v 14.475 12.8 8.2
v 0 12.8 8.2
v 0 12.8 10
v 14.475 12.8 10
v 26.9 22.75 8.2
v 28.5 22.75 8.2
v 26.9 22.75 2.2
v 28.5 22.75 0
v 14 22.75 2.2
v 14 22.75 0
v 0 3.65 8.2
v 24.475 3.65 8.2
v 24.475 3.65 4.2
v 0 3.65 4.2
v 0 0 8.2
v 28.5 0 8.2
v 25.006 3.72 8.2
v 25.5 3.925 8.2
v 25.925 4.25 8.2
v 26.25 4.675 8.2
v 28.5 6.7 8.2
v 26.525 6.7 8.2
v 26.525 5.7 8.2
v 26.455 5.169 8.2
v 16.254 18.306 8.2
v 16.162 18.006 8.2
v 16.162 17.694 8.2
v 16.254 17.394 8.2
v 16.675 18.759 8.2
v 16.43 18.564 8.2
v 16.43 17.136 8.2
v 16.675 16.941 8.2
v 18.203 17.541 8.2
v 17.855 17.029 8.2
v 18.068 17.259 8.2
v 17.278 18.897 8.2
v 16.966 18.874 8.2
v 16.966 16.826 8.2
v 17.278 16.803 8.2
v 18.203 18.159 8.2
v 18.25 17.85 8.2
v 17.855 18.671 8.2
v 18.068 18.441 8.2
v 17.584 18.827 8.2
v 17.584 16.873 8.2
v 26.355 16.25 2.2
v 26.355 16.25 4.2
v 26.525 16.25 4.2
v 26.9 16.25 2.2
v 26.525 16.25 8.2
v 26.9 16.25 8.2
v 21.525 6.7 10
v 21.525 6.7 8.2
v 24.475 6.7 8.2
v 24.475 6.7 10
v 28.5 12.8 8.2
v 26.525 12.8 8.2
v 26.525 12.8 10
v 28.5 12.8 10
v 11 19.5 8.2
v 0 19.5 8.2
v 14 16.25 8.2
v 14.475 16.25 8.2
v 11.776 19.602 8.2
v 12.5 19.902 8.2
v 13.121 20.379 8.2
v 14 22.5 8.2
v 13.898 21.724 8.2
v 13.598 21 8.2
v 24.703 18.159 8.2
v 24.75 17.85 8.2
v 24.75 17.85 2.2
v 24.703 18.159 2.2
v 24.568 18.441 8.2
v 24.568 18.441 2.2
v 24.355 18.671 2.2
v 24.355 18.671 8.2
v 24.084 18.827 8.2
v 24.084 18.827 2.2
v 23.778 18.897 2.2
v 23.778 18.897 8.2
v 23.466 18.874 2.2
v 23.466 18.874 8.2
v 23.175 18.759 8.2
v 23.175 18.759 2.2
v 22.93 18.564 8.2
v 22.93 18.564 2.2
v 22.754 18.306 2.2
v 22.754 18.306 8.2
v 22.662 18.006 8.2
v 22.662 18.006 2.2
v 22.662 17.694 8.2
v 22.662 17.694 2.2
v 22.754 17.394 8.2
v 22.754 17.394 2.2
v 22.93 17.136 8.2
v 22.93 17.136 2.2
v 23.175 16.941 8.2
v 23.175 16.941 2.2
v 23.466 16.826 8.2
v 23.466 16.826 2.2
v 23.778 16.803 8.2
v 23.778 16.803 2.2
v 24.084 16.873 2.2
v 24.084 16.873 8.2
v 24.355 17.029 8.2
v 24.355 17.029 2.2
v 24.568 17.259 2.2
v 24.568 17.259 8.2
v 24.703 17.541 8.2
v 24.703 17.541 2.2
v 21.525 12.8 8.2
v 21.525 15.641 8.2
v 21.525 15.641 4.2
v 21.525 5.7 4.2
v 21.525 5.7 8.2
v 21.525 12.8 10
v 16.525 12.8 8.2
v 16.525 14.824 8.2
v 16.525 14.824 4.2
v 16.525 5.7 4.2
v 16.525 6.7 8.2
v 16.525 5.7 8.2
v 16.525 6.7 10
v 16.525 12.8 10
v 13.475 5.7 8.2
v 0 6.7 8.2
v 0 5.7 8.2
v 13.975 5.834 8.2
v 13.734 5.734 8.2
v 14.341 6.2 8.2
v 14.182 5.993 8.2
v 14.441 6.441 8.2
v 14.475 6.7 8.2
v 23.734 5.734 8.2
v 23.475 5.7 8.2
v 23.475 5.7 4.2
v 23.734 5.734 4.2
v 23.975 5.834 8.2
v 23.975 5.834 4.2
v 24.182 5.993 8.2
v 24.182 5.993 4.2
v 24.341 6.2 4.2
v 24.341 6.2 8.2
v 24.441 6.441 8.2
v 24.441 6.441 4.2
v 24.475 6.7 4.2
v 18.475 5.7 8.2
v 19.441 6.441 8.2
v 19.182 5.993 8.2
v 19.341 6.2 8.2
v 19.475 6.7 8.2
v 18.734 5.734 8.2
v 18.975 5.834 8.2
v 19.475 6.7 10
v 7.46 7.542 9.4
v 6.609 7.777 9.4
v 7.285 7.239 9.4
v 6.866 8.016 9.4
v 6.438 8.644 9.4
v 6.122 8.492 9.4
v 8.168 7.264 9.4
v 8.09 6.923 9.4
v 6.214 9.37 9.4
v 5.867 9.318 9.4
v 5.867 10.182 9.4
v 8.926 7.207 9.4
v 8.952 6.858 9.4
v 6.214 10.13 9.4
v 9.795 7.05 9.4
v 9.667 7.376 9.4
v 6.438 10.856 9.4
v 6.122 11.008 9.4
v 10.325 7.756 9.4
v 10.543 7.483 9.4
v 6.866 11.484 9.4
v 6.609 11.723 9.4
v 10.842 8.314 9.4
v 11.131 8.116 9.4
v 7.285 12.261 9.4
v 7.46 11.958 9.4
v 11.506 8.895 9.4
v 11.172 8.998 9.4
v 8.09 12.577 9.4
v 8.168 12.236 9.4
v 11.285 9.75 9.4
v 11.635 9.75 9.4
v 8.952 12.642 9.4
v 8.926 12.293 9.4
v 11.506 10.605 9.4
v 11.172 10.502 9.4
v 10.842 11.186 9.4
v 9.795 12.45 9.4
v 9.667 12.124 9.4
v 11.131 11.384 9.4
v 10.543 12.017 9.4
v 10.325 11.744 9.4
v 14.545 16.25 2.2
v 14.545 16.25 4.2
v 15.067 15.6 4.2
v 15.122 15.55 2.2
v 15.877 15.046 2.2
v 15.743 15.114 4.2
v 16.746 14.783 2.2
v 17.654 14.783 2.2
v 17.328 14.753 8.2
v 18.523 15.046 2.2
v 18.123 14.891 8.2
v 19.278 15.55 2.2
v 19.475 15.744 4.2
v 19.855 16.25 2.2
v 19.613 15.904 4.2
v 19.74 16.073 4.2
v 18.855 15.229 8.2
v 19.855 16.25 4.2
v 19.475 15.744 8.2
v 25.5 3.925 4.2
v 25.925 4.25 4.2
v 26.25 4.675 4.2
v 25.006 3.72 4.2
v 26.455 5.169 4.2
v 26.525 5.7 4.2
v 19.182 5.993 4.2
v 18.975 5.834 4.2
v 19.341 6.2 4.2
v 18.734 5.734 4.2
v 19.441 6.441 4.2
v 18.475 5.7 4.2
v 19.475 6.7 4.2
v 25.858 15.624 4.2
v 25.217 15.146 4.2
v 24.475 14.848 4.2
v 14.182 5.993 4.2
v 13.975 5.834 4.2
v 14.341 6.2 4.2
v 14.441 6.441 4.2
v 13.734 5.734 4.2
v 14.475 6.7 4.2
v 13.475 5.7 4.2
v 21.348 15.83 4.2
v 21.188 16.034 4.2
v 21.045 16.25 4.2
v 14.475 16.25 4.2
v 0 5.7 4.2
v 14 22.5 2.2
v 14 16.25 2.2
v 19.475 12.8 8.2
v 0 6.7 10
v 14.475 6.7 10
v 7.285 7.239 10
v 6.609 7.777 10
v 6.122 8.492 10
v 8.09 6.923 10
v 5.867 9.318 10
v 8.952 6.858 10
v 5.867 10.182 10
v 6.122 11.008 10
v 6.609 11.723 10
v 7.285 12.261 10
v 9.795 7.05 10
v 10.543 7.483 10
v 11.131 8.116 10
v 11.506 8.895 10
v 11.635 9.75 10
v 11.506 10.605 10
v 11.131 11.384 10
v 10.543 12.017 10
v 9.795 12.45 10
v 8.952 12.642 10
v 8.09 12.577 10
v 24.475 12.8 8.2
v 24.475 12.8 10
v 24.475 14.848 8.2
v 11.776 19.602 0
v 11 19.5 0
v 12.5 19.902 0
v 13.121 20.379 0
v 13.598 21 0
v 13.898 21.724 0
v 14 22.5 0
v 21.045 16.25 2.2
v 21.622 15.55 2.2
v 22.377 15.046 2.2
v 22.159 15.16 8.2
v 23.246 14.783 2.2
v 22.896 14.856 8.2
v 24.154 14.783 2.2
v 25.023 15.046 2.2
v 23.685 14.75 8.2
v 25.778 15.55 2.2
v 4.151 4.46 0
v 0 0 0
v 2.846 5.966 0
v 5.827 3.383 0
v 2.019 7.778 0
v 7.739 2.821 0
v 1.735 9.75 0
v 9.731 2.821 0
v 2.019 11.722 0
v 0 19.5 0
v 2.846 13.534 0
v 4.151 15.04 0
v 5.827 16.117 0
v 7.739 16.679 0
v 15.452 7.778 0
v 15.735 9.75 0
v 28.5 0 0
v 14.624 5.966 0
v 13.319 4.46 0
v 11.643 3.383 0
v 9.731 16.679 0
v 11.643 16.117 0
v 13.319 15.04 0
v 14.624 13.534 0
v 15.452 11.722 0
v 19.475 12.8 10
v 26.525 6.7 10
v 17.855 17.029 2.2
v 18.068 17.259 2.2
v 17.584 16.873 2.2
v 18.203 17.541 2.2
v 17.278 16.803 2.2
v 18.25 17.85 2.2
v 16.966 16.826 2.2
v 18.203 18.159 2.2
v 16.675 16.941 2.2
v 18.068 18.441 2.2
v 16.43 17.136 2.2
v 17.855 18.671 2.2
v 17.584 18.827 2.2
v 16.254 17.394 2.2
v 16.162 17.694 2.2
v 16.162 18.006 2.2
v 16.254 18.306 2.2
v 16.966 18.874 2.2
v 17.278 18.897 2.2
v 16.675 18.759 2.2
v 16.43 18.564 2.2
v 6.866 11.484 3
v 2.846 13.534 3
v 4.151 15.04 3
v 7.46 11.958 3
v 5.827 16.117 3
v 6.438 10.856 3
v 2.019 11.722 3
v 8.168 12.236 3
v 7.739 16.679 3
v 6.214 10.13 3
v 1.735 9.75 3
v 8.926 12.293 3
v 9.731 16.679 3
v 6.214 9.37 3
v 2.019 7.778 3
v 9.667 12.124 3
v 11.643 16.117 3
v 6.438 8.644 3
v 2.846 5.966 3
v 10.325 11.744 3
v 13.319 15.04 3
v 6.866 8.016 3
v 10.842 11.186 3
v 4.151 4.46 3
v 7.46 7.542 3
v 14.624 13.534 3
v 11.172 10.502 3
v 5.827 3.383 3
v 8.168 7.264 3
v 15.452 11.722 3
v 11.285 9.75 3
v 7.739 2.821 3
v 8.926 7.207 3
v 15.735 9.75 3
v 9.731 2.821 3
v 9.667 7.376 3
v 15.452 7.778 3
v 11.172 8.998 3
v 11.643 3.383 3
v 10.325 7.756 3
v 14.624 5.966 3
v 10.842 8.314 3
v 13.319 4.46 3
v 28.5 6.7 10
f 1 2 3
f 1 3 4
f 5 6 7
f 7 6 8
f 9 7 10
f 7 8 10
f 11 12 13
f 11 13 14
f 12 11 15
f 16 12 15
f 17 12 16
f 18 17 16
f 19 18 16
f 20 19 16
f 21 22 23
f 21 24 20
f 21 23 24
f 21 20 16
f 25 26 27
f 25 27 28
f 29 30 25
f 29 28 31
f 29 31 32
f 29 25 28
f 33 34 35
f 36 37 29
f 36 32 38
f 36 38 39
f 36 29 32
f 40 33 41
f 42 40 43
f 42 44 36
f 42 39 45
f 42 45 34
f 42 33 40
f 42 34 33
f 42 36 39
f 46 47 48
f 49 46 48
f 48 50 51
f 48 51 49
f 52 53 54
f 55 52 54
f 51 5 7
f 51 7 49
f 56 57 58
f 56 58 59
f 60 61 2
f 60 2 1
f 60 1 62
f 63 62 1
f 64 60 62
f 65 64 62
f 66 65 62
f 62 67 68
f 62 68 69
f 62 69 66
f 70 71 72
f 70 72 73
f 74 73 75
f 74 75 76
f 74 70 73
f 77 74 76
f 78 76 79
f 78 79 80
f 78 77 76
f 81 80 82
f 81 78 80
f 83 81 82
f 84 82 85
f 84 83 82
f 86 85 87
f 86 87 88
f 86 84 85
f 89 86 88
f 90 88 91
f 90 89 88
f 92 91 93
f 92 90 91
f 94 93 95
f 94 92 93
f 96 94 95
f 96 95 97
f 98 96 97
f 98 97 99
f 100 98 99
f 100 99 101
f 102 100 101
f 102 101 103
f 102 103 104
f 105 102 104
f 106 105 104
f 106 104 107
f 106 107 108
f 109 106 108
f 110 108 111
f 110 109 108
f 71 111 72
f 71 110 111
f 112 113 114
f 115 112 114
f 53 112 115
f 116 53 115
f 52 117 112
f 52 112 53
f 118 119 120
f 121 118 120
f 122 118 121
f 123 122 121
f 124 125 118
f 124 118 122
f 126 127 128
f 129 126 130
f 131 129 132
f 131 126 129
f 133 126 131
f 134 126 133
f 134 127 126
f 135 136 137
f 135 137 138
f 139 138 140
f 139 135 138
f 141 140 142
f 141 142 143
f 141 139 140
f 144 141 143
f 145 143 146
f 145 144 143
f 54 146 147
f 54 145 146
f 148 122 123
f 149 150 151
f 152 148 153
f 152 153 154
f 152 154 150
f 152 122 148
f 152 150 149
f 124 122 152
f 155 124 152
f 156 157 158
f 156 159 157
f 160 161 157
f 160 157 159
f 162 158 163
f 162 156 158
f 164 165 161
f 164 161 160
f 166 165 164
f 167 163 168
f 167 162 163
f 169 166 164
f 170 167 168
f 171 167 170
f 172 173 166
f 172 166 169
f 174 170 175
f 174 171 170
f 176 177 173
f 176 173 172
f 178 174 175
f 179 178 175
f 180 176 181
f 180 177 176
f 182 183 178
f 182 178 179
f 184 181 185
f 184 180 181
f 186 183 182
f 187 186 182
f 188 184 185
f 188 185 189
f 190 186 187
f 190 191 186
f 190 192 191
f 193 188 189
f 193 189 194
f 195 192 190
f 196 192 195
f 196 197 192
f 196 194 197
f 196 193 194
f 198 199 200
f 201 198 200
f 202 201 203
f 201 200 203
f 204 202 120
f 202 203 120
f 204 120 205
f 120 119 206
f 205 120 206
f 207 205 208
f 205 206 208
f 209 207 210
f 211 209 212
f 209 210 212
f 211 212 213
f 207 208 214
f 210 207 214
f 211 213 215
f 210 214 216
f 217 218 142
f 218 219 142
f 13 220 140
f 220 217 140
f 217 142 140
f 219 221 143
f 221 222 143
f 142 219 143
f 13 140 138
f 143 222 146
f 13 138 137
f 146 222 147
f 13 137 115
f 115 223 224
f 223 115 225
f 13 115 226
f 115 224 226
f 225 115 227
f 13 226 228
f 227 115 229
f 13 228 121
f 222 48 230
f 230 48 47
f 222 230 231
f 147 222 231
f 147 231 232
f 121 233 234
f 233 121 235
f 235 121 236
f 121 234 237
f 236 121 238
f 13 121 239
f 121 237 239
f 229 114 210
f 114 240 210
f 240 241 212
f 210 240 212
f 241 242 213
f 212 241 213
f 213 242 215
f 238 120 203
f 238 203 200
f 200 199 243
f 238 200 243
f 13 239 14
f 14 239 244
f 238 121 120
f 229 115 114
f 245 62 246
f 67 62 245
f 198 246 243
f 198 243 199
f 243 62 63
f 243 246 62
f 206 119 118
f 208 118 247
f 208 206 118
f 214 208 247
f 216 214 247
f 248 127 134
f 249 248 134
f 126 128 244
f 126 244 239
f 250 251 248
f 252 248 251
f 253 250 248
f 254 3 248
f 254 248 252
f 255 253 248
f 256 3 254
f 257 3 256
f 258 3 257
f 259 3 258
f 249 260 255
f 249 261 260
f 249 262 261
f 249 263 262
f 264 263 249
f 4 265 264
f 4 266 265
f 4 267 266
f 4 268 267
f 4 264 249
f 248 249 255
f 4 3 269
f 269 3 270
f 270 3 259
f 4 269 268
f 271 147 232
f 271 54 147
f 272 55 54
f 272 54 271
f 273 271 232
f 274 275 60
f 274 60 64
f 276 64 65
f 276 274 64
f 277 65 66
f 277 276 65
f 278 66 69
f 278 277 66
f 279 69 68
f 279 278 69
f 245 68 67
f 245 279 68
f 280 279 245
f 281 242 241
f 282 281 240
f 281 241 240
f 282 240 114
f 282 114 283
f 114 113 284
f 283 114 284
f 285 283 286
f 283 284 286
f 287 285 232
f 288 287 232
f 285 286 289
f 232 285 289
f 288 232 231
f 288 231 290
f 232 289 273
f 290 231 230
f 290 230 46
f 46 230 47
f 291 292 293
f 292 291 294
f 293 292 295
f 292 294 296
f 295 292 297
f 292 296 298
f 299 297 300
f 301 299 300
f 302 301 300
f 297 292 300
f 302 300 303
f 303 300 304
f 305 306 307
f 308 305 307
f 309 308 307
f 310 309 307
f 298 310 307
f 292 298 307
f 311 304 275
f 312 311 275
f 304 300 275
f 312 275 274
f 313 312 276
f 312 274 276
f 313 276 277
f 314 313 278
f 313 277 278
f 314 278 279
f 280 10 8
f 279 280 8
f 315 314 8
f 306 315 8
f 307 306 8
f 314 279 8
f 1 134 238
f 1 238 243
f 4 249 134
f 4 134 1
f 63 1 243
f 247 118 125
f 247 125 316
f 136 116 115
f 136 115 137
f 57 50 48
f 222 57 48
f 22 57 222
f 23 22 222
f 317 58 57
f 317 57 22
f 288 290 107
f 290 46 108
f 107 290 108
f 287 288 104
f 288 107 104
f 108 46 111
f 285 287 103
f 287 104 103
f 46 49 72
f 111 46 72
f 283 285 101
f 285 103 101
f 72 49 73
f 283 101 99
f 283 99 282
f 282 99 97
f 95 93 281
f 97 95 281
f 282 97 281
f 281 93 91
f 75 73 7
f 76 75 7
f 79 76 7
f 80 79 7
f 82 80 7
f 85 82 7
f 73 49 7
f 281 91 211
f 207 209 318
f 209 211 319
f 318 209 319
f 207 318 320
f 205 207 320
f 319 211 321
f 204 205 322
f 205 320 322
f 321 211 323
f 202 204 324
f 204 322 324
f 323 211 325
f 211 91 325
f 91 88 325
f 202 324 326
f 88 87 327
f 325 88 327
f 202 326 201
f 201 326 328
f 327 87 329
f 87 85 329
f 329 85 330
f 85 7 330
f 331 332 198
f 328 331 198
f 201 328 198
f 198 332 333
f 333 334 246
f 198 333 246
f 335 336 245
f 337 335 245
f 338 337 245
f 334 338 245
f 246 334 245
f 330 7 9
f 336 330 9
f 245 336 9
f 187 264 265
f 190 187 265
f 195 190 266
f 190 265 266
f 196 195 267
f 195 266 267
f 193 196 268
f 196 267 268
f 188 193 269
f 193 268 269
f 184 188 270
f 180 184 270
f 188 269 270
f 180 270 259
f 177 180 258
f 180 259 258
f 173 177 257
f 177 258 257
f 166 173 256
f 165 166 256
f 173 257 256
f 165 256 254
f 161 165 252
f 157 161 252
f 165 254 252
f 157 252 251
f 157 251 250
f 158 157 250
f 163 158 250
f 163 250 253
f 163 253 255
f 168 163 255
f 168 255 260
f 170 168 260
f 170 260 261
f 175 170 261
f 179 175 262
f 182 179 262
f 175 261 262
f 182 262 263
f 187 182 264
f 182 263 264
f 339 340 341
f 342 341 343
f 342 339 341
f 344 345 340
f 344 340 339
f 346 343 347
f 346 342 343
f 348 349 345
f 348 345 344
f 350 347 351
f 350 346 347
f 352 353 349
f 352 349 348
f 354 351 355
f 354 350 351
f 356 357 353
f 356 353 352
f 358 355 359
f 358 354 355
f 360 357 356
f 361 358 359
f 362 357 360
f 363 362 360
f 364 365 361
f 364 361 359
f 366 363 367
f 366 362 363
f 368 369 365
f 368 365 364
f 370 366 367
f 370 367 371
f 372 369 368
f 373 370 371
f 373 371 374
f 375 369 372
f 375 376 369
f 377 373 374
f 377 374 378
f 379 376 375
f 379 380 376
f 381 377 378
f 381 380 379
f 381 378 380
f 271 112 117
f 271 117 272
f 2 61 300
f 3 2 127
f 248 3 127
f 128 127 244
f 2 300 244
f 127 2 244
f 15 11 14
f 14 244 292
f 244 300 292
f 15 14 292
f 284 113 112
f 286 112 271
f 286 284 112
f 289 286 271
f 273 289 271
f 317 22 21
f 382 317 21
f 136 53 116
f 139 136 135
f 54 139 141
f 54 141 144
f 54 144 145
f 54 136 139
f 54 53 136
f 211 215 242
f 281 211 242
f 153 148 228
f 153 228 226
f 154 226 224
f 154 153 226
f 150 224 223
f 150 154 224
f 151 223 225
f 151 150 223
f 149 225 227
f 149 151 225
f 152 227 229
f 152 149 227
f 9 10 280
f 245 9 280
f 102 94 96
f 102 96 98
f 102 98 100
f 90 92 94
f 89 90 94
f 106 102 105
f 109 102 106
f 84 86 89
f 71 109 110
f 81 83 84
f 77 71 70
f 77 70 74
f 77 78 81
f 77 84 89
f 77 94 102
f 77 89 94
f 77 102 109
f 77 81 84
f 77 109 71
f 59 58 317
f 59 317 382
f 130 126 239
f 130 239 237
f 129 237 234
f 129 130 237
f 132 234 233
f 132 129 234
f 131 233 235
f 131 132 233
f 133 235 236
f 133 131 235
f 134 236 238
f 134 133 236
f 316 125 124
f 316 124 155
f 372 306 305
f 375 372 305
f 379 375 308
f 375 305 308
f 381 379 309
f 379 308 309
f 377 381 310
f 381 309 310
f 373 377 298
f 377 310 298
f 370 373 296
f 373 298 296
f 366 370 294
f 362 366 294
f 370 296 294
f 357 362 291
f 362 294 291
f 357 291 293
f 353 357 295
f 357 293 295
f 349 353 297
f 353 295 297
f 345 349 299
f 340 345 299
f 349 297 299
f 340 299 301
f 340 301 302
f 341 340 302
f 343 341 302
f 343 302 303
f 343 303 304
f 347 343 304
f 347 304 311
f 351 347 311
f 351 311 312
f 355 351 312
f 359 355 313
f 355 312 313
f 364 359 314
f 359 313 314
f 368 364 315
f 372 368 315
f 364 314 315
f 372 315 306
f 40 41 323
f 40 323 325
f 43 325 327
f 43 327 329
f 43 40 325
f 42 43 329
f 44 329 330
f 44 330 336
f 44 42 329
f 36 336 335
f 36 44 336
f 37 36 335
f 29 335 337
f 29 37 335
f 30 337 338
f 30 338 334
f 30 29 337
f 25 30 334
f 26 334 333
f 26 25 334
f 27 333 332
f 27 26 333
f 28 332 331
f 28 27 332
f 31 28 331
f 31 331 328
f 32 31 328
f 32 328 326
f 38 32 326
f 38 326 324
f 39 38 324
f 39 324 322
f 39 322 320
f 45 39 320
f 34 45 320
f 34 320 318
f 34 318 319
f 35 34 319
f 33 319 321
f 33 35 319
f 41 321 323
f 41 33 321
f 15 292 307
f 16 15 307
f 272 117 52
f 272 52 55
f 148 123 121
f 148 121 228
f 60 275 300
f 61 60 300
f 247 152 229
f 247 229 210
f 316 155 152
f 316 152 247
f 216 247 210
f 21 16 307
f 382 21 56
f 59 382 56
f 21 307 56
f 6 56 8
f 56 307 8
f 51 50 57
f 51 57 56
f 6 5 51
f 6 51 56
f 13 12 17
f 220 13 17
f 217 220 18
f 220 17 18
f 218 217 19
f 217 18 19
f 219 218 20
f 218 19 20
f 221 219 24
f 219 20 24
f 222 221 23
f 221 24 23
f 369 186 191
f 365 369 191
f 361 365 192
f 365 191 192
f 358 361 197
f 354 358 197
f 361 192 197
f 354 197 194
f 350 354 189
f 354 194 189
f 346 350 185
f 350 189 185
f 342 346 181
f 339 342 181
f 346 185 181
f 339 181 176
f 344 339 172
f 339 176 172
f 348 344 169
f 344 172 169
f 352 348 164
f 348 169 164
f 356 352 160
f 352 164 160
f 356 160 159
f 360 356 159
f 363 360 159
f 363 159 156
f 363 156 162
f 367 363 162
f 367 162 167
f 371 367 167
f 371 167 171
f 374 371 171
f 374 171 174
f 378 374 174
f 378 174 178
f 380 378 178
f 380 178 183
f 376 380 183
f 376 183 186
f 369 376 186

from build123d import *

# Parameters (mm, degrees)
PAD004_DEPTH    = 8.2
SKETCH014_W     = 28.5
SKETCH014_H     = 6.1
PAD005_DEPTH    = 1.8
SKETCH015_R     = 2.9
POCKET004_DEPTH = 0.6
SKETCH016_W     = 2.05
SKETCH016_H     = 6.1
POCKET005_DEPTH = 1.8
SKETCH018_R     = 1.05
POCKET007_DEPTH = 6
POCKET006_DEPTH = 4
SKETCH019_R     = 2.55
POCKET008_DEPTH = 7.5
SKETCH020_R     = 7
POCKET_DEPTH    = 3


with BuildPart() as stage_1_railguide:
    # Sketch013 → Pad004 (new body)
    with BuildSketch(Plane.XY):
        with BuildLine():
            Line((0, 0), (28.5, 0))
            Line((28.5, 0), (28.5, 22.75))
            Line((28.5, 22.75), (14, 22.75))
            Line((14, 22.75), (14, 22.5))
            ThreePointArc((11, 19.5), (13.12132, 20.37868), (14, 22.5))
            Line((11, 19.5), (0, 19.5))
            Line((0, 19.5), (0, 0))
        make_face()
    extrude(amount=PAD004_DEPTH)

    # Sketch014 (on Face9 of Pad004) → Pad005 (join)
    with BuildSketch(Plane.XY.offset(8.2)):
        with Locations((14.25, 9.75)):
            Rectangle(SKETCH014_W, SKETCH014_H)
    extrude(amount=PAD005_DEPTH)

    # Sketch015 (on Face11 of Pad005) → Pocket004 (cut)
    with BuildSketch(Plane.XY.offset(10)):
        with Locations((8.735056, 9.75)):
            Circle(SKETCH015_R)
    extrude(amount=-POCKET004_DEPTH, mode=Mode.SUBTRACT)

    # Sketch016 (on Face10 of Pocket004) → Pocket005 (cut)
    with BuildSketch(Plane.XY.offset(10)):
        with Locations((15.5, 9.75)):
            Rectangle(SKETCH016_W, SKETCH016_H)
        Polygon((21.525, 12.8), (21.525, 6.7), (19.475, 6.7), (19.475, 12.8), (20.5, 12.8), align=None)
        with Locations((25.5, 9.75)):
            Rectangle(SKETCH016_W, SKETCH016_H)
    extrude(amount=-POCKET005_DEPTH, mode=Mode.SUBTRACT)


with BuildPart() as body:
    # Body006 base: copy of Stage#1(RailGuide)
    add(stage_1_railguide.part)

    # Sketch018 (on Face19 of Clone001) → Pocket007 (cut)
    with BuildSketch(Plane.XY.offset(8.2)):
        with BuildLine():
            Line((14, 22.75), (26.9, 22.75))
            Line((26.9, 22.75), (26.9, 16.25))
            Line((26.355184, 16.25), (26.9, 16.25))
            ThreePointArc((21.044816, 16.25), (23.7, 14.75), (26.355184, 16.25))
            Line((20.45, 16.25), (21.044816, 16.25))
            Line((19.855184, 16.25), (20.45, 16.25))
            ThreePointArc((14.544816, 16.25), (17.2, 14.75), (19.855184, 16.25))
            Line((14, 16.25), (14.544816, 16.25))
            Line((14, 16.25), (14, 22.75))
        make_face()
        with Locations((17.2, 17.85)):
            Circle(SKETCH018_R, mode=Mode.SUBTRACT)
        with Locations((23.7, 17.85)):
            Circle(SKETCH018_R, mode=Mode.SUBTRACT)
    extrude(amount=-POCKET007_DEPTH, mode=Mode.SUBTRACT)


with BuildPart() as body008:
    # Body005 base: copy of Stage#1(RailGuide)
    add(stage_1_railguide.part)

    # Sketch017 (on Face19 of Clone) → Pocket006 (cut)
    with BuildSketch(Plane.XY.offset(8.2)):
        with BuildLine():
            Line((0, 5.7), (13.475, 5.7))
            ThreePointArc((13.475, 5.7), (14.182107, 5.992893), (14.475, 6.7))
            Line((14.475, 6.7), (14.475, 16.75))
            Line((14.475, 16.75), (16.525, 16.75))
            Line((16.525, 16.75), (16.525, 5.7))
            Line((16.525, 5.7), (18.475, 5.7))
            ThreePointArc((18.475, 5.7), (19.182107, 5.992893), (19.475, 6.7))
            Line((19.475, 6.7), (19.475, 16.75))
            Line((19.475, 16.75), (21.525, 16.75))
            Line((21.525, 16.75), (21.525, 5.699968))
            Line((21.525, 5.699968), (23.475, 5.699968))
            ThreePointArc((23.475, 5.699968), (24.182107, 5.992862), (24.475, 6.699968))
            Line((24.475, 6.699968), (24.475, 16.75))
            Line((24.475, 16.75), (26.525, 16.75))
            Line((26.525, 16.75), (26.525, 5.7))
            ThreePointArc((24.475, 3.65), (25.924569, 4.250431), (26.525, 5.7))
            Line((24.475, 3.65), (0, 3.65))
            Line((0, 3.65), (0, 5.7))
        make_face()
    extrude(amount=-POCKET006_DEPTH, mode=Mode.SUBTRACT)

    # Sketch019 (on Face37 of Pocket006) → Pocket008 (cut)
    with BuildSketch(Plane.XY.offset(9.4)):
        with Locations((8.735056, 9.75)):
            Circle(SKETCH019_R)
    extrude(amount=-POCKET008_DEPTH, mode=Mode.SUBTRACT)

    # Sketch020 (on Face4 of Pocket008) → Pocket (cut)
    with BuildSketch(Plane(origin=(0, 0, 0), x_dir=(1, 0, 0), z_dir=(0, 0, -1))):
        with Locations((8.735056, -9.75)):
            Circle(SKETCH020_R)
    extrude(amount=-POCKET_DEPTH, mode=Mode.SUBTRACT)

    # Common: intersect Body
    add(body.part, mode=Mode.INTERSECT)


solid = body008.part
